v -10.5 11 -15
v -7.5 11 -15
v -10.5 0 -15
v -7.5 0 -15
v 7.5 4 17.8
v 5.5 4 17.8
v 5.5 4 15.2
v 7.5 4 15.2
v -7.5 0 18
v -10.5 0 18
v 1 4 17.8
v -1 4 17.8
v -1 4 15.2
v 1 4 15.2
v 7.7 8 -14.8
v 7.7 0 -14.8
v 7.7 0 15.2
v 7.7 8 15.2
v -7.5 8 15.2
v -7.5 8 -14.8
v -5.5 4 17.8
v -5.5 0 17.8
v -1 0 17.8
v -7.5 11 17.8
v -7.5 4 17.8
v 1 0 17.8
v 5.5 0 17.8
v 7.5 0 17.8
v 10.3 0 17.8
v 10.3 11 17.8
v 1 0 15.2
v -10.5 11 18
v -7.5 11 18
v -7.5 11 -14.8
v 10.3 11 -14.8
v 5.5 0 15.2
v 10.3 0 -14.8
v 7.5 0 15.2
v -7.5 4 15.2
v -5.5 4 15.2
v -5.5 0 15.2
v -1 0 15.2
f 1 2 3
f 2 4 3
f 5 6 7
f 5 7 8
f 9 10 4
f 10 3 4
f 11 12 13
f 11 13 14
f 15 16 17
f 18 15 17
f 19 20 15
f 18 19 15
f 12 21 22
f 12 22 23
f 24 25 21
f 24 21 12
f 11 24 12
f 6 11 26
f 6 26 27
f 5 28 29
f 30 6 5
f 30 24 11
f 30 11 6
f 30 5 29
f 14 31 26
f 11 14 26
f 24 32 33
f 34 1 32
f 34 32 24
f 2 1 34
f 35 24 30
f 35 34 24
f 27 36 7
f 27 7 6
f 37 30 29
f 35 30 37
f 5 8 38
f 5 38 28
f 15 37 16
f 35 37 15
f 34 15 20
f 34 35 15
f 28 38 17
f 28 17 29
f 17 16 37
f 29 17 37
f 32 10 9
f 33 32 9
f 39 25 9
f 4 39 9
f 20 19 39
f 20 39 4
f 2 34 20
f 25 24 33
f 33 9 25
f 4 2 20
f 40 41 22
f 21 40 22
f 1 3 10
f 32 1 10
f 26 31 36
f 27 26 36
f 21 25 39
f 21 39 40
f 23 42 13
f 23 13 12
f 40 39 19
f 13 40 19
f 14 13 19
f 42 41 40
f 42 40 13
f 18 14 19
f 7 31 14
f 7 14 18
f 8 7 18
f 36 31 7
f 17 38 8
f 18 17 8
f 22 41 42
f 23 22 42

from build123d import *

# Parameters (mm, degrees)
BOSS_EXTRUDE1_DEPTH     = 11
SKETCH2_W               = 21
SKETCH2_H               = 33
BOSS_EXTRUDE2_DEPTH     = 3
SKETCH3_W               = 2
SKETCH3_H               = 4.664590192
SKETCH3_H_2             = 8.385591547
SKETCH3_H_3             = 5.091451809
CUT_EXTRUDE1_DEPTH      = 4
CUT_EXTRUDE2_REACH      = 25.564
SKETCH4_W               = 15.2
SKETCH4_H               = 30
CUT_EXTRUDE3_DEPTH      = 24.563743336
CUT_EXTRUDE3_DEPTH_BACK = 24.563743336
SKETCH4_3_W             = 43.430774682
SKETCH4_3_H             = 55.651594456


with BuildPart() as part:
    # Sketch1 → Boss-Extrude1 (new body)
    with BuildSketch(Plane(origin=(0, 0, 0), x_dir=(1, 0, 0), z_dir=(0, 1, 0))):
        Polygon((10.5, 15), (7.5, 15), (7.5, -15), (-7.5, -15), (-7.5, 15), (-10.5, 15), (-10.5, -18), (10.5, -18), align=None)
    extrude(amount=BOSS_EXTRUDE1_DEPTH)

    # Sketch2 → Boss-Extrude2 (add)
    with BuildSketch(Plane(origin=(0, 11, 0), x_dir=(1, 0, 0), z_dir=(0, 1, 0))):
        with Locations((0, -1.5)):
            Rectangle(SKETCH2_W, SKETCH2_H)
    extrude(amount=-BOSS_EXTRUDE2_DEPTH)

    # Sketch3 → Cut-Extrude1 (cut)
    with BuildSketch(Plane.XZ):
        with Locations((-6.5, 17.332295096)):
            Rectangle(SKETCH3_W, SKETCH3_H)
        with Locations((0, 19.192795774)):
            Rectangle(SKETCH3_W, SKETCH3_H_2)
        with Locations((6.5, 17.545725905)):
            Rectangle(SKETCH3_W, SKETCH3_H_3)
    extrude(amount=-CUT_EXTRUDE1_DEPTH, mode=Mode.SUBTRACT)

    # Cut-Extrude2: up to this face of the body (flat: up to its plane)
    cut_extrude2_end = Plane(part.part.faces().sort_by_distance((0, 8, 0))[0])
    # Sketch4 → Cut-Extrude2 (cut, up to the picked face)
    with BuildSketch(Plane.XZ, mode=Mode.PRIVATE) as cut_extrude2_sk1:
        with Locations((0.1, 0.2)):
            Rectangle(SKETCH4_W, SKETCH4_H)
    cut_extrude2_tool1 = split(extrude(cut_extrude2_sk1.sketch, amount=-CUT_EXTRUDE2_REACH, mode=Mode.PRIVATE), bisect_by=cut_extrude2_end, keep=Keep.BOTH, mode=Mode.PRIVATE)
    add(cut_extrude2_tool1.solids().sort_by(Axis((0.1, 0, 0.2), (0, 1, 0)))[0], mode=Mode.SUBTRACT)

    # Sketch4<3> → Cut-Extrude3 (cut, two sides: drawn at the far end of the back side and taken through both)
    with BuildSketch(Plane.XZ.offset(-CUT_EXTRUDE3_DEPTH_BACK)):
        Rectangle(SKETCH4_3_W, SKETCH4_3_H)
        Polygon((10.3, -14.8), (7.7, -14.8), (-7.5, -14.8), (-7.5, -15), (-10.5, -15), (-10.5, 18), (-7.5, 18), (-7.5, 17.8), (-5.5, 17.8), (-1, 17.8), (1, 17.8), (5.5, 17.8), (7.5, 17.8), (10.3, 17.8), align=None, mode=Mode.SUBTRACT)
    extrude(amount=CUT_EXTRUDE3_DEPTH + CUT_EXTRUDE3_DEPTH_BACK, mode=Mode.SUBTRACT)


solid = part.part
